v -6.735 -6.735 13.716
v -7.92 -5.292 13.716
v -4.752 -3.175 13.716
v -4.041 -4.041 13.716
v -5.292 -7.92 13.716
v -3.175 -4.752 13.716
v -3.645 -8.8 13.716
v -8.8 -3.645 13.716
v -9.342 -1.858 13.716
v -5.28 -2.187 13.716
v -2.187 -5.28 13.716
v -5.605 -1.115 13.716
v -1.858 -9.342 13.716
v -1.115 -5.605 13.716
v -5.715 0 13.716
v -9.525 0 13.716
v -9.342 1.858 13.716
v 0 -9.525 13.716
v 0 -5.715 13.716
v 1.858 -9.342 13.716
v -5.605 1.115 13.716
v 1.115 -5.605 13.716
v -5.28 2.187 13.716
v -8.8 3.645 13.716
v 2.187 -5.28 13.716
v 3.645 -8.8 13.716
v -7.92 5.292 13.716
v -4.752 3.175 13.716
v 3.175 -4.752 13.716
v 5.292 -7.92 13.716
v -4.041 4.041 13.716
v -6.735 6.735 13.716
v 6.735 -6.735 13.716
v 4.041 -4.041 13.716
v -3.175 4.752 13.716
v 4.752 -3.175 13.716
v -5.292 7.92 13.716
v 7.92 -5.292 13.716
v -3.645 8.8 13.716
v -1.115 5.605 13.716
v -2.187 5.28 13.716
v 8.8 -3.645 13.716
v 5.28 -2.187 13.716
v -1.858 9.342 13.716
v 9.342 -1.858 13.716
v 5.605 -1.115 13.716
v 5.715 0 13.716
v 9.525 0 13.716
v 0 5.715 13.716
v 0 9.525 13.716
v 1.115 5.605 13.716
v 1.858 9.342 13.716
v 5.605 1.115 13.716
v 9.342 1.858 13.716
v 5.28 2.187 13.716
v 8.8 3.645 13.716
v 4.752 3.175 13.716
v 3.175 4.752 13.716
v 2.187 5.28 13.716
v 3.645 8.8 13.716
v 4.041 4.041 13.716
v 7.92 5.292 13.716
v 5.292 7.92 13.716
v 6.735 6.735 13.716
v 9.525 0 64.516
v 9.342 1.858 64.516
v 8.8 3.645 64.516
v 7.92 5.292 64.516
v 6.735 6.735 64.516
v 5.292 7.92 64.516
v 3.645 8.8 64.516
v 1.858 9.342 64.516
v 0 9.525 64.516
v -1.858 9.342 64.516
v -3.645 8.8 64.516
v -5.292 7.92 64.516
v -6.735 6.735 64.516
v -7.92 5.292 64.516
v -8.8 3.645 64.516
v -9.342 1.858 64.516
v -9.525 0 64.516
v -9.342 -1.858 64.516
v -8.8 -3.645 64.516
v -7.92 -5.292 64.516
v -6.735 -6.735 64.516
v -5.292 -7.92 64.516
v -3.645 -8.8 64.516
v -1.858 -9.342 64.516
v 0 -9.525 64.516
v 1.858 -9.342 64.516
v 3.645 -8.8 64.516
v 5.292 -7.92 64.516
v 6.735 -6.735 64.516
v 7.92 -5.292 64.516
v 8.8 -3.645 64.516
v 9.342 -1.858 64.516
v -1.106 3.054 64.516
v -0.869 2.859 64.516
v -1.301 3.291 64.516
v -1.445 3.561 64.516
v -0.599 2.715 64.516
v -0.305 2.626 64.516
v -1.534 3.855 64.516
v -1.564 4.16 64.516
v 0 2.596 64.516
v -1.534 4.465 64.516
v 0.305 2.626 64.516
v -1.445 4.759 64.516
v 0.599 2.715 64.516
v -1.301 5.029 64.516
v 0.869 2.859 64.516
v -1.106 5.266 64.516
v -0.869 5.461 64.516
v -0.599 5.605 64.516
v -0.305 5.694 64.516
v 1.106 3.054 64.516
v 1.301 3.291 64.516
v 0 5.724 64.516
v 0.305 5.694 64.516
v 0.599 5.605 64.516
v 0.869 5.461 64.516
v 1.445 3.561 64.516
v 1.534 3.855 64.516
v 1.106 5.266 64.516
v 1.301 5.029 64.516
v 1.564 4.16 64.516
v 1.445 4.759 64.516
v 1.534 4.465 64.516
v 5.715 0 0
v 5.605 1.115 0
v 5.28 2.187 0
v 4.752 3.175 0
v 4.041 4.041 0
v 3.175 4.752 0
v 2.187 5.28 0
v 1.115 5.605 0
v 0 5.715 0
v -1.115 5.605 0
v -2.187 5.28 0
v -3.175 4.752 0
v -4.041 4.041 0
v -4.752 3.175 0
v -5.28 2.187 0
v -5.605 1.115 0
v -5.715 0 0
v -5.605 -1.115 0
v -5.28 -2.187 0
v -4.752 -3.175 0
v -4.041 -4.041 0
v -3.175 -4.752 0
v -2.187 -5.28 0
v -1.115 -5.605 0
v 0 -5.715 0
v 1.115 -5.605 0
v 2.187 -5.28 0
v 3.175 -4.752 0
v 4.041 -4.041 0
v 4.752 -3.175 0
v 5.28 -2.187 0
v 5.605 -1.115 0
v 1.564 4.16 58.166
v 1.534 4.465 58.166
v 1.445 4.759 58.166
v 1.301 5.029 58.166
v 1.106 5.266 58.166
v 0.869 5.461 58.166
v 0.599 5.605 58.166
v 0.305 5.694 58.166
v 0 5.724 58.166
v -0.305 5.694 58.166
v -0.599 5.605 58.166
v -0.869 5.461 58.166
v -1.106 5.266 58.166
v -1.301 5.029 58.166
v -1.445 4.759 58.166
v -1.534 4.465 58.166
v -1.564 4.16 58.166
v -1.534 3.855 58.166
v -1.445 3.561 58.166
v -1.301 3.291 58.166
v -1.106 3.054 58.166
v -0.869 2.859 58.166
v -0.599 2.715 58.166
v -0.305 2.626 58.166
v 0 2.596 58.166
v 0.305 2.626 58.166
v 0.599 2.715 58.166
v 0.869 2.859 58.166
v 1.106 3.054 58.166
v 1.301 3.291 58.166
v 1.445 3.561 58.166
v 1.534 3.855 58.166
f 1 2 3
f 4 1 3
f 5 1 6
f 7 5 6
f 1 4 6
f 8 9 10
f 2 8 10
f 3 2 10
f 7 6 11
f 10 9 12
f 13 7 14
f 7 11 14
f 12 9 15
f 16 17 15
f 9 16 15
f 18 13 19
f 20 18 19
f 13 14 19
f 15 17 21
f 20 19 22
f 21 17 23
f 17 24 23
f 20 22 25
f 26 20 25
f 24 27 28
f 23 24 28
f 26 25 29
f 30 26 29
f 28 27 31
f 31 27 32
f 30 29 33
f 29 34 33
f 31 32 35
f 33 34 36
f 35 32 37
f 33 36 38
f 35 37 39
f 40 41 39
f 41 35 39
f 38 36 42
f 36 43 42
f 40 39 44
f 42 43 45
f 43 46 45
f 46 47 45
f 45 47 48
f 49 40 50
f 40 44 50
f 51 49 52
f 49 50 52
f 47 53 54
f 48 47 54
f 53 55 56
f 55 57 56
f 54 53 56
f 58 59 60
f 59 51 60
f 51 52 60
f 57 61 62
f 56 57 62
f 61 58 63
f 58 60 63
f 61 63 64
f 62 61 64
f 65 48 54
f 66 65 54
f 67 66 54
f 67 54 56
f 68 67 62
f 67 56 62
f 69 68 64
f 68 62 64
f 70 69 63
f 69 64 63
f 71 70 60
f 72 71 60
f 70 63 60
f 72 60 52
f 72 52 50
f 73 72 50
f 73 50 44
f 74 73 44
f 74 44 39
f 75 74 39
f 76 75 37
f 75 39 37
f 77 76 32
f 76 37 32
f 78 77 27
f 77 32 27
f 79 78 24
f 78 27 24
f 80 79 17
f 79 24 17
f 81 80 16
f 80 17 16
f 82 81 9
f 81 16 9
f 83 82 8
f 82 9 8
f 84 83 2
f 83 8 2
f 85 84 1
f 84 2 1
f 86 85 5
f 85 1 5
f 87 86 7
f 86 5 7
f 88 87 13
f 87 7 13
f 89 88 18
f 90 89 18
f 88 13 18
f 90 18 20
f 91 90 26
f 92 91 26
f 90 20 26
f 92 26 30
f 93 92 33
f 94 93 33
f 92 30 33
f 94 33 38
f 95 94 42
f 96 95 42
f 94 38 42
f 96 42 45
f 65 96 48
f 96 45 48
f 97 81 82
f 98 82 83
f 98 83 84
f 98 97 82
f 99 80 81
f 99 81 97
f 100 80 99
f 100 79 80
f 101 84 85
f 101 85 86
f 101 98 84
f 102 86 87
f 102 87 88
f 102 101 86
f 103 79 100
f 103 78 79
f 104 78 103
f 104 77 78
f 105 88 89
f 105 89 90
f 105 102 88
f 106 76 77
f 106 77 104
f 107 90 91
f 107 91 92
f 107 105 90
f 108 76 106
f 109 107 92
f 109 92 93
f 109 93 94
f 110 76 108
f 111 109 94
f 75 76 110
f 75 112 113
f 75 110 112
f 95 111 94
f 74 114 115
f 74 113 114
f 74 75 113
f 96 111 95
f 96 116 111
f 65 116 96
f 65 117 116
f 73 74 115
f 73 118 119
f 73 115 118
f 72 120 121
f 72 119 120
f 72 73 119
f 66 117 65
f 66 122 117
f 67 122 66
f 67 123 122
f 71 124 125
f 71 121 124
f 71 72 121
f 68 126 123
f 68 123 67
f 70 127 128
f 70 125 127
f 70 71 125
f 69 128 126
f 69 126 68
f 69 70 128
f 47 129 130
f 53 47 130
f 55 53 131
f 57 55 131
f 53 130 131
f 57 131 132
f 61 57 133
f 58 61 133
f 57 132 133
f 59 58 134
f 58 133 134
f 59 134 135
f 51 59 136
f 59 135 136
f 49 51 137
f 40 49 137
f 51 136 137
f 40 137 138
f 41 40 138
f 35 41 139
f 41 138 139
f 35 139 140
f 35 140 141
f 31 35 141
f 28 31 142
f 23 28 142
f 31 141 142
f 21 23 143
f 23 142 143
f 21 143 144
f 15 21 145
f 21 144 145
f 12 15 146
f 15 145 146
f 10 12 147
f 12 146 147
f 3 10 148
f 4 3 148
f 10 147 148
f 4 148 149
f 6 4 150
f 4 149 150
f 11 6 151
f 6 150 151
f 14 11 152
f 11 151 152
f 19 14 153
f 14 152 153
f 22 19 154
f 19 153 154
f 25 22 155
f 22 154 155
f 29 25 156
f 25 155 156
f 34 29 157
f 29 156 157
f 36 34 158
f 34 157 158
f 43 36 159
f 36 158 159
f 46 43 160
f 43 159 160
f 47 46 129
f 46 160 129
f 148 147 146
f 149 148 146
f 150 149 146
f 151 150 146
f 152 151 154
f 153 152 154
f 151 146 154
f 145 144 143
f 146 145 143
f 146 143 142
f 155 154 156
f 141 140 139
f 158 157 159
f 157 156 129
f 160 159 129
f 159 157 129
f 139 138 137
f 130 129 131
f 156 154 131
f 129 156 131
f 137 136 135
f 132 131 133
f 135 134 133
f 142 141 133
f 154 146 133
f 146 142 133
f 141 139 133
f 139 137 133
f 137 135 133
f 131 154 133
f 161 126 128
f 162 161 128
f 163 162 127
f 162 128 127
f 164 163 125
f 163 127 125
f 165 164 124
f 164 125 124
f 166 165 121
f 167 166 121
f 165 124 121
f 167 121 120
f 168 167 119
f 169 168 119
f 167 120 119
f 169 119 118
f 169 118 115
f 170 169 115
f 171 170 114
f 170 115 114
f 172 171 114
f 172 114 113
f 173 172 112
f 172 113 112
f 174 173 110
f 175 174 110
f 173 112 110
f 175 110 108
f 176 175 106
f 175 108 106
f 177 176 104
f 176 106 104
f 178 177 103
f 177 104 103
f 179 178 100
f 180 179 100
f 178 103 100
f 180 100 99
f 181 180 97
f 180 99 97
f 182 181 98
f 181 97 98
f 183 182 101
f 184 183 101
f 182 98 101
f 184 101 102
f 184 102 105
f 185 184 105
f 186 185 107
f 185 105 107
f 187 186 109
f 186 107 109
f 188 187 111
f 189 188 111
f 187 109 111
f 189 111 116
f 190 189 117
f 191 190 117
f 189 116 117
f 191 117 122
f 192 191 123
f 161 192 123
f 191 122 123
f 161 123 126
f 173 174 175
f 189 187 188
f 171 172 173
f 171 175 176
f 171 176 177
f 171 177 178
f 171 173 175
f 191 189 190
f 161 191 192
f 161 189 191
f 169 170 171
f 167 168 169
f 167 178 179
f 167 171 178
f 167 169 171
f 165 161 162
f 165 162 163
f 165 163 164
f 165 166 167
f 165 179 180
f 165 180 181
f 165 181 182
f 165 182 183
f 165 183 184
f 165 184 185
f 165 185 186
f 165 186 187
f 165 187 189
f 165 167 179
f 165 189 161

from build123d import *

# Parameters (mm, degrees)
F0_R     = 5.715
F1_DEPTH = 13.716
F2_R     = 9.525
F2_R_2   = 5.715
F3_DEPTH = 50.8
F4_R     = 1.564291
F5_DEPTH = 6.35


with BuildPart() as f1:
    # F0 (on Top) → F1 (new body)
    with BuildSketch(Plane.XY):
        Circle(F0_R)
    extrude(amount=F1_DEPTH)

    # F2 (on face) → F3 (join)
    with BuildSketch(Plane.XY.offset(13.716)):
        Circle(F2_R)
        Circle(F2_R_2, mode=Mode.SUBTRACT)
        Circle(F2_R_2)
    extrude(amount=F3_DEPTH)

    # F4 (on face) → F5 (cut)
    with BuildSketch(Plane.XY.offset(64.516)):
        with Locations((0, 4.160097)):
            Circle(F4_R)
    extrude(amount=-F5_DEPTH, mode=Mode.SUBTRACT)


solid = f1.part
